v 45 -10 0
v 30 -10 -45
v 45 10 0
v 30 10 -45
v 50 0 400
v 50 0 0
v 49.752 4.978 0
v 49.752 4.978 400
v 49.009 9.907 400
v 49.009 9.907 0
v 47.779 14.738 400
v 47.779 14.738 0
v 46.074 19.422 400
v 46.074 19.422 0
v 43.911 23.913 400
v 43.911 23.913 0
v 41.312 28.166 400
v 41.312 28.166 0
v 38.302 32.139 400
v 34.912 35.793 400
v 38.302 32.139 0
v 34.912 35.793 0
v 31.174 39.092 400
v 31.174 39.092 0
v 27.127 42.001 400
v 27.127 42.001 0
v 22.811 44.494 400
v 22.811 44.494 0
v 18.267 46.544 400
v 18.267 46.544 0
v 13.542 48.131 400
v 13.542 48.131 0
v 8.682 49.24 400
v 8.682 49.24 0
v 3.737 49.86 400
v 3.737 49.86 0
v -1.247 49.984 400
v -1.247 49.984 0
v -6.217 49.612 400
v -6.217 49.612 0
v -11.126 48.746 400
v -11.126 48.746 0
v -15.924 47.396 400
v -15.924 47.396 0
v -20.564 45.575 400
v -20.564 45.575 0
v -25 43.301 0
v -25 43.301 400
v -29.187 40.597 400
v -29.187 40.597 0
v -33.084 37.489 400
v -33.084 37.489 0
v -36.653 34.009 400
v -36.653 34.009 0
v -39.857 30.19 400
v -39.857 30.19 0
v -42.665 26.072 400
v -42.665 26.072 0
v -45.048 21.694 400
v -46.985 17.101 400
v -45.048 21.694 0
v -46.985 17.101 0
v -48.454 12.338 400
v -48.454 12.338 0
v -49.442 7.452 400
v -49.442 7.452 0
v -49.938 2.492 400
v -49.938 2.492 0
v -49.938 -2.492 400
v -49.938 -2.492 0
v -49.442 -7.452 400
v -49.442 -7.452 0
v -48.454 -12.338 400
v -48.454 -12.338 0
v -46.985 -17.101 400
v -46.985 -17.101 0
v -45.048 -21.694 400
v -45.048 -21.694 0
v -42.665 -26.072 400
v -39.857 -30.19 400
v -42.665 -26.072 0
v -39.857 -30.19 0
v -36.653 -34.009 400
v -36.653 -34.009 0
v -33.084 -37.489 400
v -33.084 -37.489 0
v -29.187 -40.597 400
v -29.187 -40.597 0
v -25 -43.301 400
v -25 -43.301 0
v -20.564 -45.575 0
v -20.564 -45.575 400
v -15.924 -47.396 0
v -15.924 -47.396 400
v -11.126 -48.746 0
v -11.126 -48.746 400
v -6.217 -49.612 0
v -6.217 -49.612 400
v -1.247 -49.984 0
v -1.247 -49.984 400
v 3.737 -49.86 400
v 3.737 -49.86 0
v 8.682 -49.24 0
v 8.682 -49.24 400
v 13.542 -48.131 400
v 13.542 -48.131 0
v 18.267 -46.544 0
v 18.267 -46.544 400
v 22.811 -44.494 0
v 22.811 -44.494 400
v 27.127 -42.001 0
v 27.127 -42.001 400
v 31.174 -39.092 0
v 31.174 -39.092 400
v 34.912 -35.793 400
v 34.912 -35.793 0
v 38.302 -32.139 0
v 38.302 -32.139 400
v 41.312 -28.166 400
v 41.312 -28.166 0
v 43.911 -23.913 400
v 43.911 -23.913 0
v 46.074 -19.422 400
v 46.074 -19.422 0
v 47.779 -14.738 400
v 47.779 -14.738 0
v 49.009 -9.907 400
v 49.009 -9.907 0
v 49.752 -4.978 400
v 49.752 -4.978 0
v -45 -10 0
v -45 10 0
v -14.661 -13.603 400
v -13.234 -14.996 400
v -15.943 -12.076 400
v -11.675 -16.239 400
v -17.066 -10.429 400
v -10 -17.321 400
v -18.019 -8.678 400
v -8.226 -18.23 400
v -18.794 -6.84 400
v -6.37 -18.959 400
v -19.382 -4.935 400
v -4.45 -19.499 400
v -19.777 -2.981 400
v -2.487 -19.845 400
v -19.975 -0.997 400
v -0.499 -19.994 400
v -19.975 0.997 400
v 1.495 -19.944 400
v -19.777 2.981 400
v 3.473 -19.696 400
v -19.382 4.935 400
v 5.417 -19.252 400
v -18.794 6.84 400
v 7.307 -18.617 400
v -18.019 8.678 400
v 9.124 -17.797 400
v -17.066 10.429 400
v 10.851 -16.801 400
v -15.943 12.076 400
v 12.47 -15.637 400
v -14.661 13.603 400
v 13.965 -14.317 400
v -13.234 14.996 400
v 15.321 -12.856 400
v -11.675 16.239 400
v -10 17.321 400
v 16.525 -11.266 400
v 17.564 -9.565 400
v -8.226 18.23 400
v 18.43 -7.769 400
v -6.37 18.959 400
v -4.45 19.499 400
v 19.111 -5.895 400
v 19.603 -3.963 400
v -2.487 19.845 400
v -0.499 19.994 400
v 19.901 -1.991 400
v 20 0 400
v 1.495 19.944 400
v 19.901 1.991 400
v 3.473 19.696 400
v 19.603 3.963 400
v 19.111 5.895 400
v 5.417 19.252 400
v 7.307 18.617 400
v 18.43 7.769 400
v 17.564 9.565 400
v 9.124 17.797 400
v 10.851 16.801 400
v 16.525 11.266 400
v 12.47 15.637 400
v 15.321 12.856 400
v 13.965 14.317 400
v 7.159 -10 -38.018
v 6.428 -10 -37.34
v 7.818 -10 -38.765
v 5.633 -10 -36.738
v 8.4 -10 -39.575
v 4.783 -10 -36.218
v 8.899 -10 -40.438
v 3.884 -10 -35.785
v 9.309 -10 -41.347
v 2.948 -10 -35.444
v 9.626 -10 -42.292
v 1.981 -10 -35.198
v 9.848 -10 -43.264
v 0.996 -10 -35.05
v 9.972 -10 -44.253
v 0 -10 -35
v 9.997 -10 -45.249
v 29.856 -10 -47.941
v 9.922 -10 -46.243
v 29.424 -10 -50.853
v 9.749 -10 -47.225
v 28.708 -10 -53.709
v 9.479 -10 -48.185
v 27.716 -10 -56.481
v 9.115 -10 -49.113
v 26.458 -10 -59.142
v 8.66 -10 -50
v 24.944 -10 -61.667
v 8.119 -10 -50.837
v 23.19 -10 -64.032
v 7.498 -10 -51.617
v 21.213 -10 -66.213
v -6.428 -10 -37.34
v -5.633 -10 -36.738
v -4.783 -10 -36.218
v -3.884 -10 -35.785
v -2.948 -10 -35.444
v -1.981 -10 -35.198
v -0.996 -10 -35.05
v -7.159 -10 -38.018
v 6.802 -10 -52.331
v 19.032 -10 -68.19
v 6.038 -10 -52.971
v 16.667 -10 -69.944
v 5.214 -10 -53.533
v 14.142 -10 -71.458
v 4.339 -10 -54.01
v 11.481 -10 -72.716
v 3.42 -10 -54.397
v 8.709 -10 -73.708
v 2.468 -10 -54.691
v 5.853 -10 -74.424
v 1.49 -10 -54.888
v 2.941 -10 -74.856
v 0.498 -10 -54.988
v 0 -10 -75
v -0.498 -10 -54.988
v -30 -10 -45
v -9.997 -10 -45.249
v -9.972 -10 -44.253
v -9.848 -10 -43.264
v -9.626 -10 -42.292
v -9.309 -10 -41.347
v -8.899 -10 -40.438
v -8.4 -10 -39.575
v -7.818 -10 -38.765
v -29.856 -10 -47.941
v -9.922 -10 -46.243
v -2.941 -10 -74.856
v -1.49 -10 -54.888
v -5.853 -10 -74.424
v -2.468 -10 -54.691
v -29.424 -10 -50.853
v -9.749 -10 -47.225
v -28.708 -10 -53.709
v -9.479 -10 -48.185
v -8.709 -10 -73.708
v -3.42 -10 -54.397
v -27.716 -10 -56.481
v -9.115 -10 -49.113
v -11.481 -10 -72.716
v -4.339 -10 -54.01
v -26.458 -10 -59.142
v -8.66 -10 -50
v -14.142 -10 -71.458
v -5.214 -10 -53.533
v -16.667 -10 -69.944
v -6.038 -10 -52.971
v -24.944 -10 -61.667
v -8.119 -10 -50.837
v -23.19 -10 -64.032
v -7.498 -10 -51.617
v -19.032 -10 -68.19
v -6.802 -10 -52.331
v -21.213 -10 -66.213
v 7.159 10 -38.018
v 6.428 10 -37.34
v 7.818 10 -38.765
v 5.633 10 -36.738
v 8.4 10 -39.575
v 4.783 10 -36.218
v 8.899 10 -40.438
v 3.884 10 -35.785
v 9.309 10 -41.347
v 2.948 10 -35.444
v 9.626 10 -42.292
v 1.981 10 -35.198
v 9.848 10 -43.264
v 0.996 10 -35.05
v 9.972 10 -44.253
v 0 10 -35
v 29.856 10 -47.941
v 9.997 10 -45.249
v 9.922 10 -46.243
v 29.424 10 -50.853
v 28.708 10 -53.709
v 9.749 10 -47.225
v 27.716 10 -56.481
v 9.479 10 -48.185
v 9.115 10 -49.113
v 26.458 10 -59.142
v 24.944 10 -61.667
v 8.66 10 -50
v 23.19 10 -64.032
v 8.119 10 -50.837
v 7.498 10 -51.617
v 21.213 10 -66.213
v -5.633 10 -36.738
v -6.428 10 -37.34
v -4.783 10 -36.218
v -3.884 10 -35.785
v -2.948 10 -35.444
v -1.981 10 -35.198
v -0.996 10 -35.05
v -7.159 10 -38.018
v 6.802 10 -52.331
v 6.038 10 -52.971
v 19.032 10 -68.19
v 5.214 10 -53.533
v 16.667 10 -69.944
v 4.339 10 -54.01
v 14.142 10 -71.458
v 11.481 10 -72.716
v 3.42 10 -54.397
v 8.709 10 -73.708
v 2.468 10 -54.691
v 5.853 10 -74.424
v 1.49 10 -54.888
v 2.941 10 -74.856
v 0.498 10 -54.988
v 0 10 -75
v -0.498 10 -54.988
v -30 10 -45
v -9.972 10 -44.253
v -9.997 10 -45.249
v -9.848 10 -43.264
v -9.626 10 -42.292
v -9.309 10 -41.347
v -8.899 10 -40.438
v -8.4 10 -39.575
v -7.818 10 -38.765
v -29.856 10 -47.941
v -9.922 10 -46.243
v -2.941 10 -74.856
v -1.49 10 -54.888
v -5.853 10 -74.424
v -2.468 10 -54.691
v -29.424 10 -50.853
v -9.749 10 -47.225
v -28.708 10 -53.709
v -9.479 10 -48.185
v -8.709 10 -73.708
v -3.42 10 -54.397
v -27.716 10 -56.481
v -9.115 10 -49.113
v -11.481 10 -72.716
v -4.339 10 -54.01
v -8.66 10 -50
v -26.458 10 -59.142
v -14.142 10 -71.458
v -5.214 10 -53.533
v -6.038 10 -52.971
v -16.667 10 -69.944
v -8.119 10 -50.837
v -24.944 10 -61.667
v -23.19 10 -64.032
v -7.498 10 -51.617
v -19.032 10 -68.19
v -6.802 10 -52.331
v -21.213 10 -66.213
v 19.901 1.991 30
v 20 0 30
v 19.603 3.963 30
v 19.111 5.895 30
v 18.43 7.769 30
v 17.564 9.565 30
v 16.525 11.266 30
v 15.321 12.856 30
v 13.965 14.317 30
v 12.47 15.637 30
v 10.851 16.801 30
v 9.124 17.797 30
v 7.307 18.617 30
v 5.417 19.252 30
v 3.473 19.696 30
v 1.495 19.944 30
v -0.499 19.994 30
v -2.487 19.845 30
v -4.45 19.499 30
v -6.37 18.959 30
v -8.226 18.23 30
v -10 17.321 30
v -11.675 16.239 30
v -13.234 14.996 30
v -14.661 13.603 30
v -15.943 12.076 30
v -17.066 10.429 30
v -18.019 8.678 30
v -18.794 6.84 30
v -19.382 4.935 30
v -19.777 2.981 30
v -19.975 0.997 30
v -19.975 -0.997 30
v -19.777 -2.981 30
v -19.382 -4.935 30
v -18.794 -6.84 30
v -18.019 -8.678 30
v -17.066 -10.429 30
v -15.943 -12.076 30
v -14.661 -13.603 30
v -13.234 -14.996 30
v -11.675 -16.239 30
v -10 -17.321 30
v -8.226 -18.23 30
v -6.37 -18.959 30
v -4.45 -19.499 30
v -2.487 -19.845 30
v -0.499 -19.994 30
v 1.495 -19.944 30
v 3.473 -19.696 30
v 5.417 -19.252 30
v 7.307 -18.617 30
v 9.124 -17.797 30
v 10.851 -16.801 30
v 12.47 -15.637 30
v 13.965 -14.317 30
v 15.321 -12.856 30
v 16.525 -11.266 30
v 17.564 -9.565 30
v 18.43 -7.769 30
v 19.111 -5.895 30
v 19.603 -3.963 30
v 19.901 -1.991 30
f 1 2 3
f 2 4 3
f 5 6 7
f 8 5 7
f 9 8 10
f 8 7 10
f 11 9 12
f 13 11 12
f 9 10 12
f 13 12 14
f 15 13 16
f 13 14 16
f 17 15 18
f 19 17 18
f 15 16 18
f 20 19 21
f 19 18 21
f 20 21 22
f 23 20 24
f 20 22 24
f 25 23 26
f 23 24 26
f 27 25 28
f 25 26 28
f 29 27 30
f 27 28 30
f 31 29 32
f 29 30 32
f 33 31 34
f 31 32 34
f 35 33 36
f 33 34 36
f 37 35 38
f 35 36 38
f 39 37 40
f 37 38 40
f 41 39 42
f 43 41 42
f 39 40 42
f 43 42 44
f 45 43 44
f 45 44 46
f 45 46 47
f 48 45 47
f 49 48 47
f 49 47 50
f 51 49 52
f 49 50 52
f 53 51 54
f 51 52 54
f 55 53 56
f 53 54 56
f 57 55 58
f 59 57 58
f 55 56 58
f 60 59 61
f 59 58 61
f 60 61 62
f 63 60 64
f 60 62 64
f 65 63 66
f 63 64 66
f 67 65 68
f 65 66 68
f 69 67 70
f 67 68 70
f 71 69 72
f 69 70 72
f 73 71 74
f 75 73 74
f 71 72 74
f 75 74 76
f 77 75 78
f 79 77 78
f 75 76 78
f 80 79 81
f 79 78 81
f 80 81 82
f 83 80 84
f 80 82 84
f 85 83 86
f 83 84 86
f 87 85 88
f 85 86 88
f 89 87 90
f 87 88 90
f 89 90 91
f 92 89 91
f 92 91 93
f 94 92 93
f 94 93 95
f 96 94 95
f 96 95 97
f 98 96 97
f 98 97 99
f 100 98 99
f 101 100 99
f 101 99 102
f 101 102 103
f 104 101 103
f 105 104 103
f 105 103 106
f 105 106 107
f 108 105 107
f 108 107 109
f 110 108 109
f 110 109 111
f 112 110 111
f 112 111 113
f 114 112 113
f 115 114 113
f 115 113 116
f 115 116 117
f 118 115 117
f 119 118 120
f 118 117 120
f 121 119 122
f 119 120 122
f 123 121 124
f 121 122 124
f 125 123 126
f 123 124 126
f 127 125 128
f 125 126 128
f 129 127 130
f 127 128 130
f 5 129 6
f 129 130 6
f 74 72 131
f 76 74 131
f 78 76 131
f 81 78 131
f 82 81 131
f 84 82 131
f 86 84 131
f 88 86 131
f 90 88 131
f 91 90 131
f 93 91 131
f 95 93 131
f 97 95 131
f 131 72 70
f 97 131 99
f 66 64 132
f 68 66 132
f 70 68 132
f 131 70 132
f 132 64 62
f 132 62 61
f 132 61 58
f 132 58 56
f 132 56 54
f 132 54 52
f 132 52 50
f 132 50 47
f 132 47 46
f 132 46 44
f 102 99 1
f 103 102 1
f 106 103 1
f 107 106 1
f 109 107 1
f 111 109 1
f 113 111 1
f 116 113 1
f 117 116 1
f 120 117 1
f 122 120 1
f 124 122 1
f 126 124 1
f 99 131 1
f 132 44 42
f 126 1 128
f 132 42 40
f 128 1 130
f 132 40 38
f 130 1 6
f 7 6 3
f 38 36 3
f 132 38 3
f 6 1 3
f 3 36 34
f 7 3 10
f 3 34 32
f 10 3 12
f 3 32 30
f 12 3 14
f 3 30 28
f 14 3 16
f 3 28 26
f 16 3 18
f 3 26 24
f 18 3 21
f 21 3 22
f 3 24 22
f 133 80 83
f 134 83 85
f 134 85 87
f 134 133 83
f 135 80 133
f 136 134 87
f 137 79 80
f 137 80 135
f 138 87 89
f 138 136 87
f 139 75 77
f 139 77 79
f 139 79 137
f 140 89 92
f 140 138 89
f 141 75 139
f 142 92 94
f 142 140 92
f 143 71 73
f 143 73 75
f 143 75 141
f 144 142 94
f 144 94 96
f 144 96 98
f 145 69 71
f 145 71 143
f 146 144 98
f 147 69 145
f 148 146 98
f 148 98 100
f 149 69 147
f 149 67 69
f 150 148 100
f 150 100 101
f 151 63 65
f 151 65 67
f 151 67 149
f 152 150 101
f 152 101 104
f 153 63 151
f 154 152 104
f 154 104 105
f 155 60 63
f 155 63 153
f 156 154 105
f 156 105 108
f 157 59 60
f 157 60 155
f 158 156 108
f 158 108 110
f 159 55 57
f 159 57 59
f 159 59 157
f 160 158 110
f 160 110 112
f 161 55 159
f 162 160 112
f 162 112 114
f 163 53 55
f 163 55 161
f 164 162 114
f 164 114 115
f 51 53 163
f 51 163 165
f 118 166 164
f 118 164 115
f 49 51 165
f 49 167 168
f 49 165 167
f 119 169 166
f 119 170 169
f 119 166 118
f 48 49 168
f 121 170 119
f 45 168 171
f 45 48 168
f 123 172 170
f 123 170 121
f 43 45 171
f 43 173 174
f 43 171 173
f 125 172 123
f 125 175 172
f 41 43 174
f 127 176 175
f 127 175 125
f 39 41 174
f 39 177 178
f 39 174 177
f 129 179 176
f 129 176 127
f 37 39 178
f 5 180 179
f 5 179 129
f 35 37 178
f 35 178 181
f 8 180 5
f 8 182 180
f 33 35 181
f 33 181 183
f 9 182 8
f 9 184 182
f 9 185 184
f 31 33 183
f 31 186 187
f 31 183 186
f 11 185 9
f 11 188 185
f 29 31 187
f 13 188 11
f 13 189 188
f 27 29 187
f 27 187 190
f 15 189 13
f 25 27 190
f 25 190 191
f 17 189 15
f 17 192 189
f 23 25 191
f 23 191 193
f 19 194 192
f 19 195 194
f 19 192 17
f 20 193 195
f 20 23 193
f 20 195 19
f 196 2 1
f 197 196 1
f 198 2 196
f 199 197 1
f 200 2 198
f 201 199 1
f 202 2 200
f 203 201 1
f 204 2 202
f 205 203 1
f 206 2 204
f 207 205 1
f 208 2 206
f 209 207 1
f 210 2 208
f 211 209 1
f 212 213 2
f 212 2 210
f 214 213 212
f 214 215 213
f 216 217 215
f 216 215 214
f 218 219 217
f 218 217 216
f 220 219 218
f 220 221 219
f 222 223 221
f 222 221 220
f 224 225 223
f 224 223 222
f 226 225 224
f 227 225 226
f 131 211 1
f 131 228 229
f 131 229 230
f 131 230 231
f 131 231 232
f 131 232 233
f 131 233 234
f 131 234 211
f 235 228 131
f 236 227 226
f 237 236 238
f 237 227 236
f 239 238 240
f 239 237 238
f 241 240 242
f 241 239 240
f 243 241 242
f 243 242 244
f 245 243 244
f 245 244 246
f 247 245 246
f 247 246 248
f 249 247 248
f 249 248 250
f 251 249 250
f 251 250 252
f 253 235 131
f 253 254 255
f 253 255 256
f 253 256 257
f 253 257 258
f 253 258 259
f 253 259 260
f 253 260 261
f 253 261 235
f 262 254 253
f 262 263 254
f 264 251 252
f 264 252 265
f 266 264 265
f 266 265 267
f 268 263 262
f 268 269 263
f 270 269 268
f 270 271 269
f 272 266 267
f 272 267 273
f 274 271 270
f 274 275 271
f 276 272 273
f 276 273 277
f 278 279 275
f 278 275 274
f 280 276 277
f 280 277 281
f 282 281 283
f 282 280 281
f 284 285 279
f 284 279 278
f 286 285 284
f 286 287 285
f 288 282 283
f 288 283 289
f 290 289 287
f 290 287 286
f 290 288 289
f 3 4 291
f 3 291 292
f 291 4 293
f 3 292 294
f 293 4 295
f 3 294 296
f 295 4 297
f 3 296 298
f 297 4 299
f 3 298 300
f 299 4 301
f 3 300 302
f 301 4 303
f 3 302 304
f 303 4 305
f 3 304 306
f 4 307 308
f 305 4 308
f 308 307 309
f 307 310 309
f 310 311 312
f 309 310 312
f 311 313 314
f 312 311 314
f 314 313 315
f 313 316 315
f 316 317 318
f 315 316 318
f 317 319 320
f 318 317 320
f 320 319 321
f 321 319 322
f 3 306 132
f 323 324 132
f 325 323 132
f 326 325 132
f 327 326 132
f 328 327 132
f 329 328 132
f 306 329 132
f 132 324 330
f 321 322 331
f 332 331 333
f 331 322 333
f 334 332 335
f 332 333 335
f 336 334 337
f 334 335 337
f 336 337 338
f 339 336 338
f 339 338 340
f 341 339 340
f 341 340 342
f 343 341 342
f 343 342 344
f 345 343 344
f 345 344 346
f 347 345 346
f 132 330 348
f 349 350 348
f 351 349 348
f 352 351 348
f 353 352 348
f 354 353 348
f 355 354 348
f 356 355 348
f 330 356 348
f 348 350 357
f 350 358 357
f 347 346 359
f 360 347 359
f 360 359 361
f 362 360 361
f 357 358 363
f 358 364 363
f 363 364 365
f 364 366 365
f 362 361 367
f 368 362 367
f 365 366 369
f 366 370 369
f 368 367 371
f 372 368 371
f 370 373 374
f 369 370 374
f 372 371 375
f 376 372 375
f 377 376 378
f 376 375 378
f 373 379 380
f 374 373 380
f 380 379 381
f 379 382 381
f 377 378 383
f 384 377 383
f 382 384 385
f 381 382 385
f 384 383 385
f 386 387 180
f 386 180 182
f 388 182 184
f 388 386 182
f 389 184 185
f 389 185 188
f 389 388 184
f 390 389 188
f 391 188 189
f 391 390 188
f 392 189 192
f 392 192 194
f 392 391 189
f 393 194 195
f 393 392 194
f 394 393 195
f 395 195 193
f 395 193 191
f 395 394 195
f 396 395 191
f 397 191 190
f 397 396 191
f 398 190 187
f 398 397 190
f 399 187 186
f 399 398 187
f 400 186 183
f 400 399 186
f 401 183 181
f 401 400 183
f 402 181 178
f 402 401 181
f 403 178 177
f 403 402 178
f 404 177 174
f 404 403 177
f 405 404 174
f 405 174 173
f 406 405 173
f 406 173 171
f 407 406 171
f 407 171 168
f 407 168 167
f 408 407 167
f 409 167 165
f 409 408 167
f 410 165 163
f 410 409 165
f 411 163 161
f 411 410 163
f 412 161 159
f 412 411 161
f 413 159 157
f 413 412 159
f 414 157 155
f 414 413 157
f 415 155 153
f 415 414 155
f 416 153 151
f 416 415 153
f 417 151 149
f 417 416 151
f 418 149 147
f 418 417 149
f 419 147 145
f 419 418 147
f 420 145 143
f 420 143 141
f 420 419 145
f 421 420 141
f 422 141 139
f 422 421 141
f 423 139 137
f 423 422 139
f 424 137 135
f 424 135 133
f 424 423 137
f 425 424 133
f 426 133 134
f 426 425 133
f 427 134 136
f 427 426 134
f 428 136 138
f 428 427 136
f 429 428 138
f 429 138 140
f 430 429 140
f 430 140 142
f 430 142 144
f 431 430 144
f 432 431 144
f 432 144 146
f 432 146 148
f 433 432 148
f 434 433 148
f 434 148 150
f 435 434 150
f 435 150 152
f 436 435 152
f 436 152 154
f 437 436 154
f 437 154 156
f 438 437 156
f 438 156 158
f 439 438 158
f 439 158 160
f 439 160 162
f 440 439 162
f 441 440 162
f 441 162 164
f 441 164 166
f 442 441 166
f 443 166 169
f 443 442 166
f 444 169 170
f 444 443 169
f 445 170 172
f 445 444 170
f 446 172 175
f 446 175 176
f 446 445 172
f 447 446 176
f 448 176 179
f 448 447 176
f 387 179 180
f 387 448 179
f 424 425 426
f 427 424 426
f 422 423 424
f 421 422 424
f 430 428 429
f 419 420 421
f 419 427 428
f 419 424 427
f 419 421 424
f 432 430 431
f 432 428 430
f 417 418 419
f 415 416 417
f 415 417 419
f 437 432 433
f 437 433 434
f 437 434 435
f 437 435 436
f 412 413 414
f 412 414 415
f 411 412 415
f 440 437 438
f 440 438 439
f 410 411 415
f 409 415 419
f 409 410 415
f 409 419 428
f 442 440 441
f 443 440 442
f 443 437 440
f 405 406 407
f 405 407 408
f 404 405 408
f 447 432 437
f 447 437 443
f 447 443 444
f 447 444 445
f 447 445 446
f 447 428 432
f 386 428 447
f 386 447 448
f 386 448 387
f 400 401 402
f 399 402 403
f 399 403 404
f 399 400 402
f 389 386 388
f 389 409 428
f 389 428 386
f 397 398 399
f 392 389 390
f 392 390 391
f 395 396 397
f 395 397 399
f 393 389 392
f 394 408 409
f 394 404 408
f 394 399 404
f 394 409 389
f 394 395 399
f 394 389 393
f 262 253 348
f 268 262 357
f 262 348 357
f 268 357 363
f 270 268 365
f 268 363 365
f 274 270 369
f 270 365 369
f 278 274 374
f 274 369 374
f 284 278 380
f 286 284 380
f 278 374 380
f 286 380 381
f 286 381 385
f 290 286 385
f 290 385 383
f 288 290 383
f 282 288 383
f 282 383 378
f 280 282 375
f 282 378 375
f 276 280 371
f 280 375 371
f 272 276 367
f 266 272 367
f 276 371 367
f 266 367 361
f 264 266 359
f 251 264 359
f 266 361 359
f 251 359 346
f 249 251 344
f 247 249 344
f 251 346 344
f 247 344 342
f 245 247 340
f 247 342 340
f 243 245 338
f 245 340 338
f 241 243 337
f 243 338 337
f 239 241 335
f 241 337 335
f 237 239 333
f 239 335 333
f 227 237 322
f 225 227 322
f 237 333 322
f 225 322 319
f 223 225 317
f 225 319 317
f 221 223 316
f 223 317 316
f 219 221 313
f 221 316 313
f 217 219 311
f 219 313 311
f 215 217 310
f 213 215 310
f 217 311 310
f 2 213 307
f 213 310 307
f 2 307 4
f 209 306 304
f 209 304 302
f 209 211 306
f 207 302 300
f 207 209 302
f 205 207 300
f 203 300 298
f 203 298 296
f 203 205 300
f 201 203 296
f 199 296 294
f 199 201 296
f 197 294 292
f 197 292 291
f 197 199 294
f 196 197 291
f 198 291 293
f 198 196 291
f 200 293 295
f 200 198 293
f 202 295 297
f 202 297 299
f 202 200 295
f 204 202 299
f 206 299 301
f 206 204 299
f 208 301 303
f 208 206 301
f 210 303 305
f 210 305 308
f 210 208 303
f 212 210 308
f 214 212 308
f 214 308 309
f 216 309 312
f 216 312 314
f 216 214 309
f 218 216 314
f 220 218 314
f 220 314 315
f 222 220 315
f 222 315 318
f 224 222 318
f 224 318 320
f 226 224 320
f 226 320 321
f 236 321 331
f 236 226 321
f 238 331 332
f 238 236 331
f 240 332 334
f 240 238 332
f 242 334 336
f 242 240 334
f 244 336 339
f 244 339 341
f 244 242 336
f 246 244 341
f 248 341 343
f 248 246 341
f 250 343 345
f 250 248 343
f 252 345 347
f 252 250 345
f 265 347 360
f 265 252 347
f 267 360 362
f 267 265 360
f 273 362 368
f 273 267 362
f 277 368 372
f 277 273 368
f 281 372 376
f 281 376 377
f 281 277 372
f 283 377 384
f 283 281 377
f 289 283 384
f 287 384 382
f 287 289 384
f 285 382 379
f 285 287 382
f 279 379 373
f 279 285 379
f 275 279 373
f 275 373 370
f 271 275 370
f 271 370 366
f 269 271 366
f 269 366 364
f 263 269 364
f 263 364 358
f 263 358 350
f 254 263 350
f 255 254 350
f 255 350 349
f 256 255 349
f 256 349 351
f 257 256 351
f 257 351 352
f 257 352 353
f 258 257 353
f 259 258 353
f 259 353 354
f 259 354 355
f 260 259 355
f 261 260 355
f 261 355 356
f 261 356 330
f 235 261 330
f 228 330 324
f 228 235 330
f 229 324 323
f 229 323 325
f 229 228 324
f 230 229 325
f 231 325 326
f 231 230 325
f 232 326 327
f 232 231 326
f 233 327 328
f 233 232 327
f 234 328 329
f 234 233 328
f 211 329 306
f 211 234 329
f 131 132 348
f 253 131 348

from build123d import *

# Parameters (mm, degrees)
SKETCH1_R           = 50
BOSS_EXTRUDE1_DEPTH = 400
SKETCH3_R           = 10
BOSS_EXTRUDE2_DEPTH = 10
SHELL1_START        = 30
SHELL1_OUTLINE_R    = 20
SHELL1_DEPTH        = 370


# Read off the part's stored shape, not the designer's step: Shell1
with BuildPart() as part:
    # Sketch1 → Boss-Extrude1 (new body)
    with BuildSketch(Plane.XY):
        Circle(SKETCH1_R)
    extrude(amount=BOSS_EXTRUDE1_DEPTH)

    # Sketch3 → Boss-Extrude2 (add, symmetric)
    with BuildSketch(Plane(origin=(0, 0, 0), x_dir=(1, 0, 0), z_dir=(0, 1, 0))):
        with BuildLine():
            ThreePointArc((-30, 45), (0, 75), (30, 45))
            Line((30, 45), (45, 0))
            Line((45, 0), (-45, 0))
            Line((-45, 0), (-30, 45))
        make_face()
        with Locations(Location((0, 45, 0), (0, 0, 270))):
            Circle(SKETCH3_R, mode=Mode.SUBTRACT)
    extrude(amount=BOSS_EXTRUDE2_DEPTH, both=True)

    # Shell1 outline → Shell1 (cut)
    with BuildSketch(Plane.XY.offset(SHELL1_START)):
        Circle(SHELL1_OUTLINE_R)
    extrude(amount=SHELL1_DEPTH, mode=Mode.SUBTRACT)


solid = part.part
